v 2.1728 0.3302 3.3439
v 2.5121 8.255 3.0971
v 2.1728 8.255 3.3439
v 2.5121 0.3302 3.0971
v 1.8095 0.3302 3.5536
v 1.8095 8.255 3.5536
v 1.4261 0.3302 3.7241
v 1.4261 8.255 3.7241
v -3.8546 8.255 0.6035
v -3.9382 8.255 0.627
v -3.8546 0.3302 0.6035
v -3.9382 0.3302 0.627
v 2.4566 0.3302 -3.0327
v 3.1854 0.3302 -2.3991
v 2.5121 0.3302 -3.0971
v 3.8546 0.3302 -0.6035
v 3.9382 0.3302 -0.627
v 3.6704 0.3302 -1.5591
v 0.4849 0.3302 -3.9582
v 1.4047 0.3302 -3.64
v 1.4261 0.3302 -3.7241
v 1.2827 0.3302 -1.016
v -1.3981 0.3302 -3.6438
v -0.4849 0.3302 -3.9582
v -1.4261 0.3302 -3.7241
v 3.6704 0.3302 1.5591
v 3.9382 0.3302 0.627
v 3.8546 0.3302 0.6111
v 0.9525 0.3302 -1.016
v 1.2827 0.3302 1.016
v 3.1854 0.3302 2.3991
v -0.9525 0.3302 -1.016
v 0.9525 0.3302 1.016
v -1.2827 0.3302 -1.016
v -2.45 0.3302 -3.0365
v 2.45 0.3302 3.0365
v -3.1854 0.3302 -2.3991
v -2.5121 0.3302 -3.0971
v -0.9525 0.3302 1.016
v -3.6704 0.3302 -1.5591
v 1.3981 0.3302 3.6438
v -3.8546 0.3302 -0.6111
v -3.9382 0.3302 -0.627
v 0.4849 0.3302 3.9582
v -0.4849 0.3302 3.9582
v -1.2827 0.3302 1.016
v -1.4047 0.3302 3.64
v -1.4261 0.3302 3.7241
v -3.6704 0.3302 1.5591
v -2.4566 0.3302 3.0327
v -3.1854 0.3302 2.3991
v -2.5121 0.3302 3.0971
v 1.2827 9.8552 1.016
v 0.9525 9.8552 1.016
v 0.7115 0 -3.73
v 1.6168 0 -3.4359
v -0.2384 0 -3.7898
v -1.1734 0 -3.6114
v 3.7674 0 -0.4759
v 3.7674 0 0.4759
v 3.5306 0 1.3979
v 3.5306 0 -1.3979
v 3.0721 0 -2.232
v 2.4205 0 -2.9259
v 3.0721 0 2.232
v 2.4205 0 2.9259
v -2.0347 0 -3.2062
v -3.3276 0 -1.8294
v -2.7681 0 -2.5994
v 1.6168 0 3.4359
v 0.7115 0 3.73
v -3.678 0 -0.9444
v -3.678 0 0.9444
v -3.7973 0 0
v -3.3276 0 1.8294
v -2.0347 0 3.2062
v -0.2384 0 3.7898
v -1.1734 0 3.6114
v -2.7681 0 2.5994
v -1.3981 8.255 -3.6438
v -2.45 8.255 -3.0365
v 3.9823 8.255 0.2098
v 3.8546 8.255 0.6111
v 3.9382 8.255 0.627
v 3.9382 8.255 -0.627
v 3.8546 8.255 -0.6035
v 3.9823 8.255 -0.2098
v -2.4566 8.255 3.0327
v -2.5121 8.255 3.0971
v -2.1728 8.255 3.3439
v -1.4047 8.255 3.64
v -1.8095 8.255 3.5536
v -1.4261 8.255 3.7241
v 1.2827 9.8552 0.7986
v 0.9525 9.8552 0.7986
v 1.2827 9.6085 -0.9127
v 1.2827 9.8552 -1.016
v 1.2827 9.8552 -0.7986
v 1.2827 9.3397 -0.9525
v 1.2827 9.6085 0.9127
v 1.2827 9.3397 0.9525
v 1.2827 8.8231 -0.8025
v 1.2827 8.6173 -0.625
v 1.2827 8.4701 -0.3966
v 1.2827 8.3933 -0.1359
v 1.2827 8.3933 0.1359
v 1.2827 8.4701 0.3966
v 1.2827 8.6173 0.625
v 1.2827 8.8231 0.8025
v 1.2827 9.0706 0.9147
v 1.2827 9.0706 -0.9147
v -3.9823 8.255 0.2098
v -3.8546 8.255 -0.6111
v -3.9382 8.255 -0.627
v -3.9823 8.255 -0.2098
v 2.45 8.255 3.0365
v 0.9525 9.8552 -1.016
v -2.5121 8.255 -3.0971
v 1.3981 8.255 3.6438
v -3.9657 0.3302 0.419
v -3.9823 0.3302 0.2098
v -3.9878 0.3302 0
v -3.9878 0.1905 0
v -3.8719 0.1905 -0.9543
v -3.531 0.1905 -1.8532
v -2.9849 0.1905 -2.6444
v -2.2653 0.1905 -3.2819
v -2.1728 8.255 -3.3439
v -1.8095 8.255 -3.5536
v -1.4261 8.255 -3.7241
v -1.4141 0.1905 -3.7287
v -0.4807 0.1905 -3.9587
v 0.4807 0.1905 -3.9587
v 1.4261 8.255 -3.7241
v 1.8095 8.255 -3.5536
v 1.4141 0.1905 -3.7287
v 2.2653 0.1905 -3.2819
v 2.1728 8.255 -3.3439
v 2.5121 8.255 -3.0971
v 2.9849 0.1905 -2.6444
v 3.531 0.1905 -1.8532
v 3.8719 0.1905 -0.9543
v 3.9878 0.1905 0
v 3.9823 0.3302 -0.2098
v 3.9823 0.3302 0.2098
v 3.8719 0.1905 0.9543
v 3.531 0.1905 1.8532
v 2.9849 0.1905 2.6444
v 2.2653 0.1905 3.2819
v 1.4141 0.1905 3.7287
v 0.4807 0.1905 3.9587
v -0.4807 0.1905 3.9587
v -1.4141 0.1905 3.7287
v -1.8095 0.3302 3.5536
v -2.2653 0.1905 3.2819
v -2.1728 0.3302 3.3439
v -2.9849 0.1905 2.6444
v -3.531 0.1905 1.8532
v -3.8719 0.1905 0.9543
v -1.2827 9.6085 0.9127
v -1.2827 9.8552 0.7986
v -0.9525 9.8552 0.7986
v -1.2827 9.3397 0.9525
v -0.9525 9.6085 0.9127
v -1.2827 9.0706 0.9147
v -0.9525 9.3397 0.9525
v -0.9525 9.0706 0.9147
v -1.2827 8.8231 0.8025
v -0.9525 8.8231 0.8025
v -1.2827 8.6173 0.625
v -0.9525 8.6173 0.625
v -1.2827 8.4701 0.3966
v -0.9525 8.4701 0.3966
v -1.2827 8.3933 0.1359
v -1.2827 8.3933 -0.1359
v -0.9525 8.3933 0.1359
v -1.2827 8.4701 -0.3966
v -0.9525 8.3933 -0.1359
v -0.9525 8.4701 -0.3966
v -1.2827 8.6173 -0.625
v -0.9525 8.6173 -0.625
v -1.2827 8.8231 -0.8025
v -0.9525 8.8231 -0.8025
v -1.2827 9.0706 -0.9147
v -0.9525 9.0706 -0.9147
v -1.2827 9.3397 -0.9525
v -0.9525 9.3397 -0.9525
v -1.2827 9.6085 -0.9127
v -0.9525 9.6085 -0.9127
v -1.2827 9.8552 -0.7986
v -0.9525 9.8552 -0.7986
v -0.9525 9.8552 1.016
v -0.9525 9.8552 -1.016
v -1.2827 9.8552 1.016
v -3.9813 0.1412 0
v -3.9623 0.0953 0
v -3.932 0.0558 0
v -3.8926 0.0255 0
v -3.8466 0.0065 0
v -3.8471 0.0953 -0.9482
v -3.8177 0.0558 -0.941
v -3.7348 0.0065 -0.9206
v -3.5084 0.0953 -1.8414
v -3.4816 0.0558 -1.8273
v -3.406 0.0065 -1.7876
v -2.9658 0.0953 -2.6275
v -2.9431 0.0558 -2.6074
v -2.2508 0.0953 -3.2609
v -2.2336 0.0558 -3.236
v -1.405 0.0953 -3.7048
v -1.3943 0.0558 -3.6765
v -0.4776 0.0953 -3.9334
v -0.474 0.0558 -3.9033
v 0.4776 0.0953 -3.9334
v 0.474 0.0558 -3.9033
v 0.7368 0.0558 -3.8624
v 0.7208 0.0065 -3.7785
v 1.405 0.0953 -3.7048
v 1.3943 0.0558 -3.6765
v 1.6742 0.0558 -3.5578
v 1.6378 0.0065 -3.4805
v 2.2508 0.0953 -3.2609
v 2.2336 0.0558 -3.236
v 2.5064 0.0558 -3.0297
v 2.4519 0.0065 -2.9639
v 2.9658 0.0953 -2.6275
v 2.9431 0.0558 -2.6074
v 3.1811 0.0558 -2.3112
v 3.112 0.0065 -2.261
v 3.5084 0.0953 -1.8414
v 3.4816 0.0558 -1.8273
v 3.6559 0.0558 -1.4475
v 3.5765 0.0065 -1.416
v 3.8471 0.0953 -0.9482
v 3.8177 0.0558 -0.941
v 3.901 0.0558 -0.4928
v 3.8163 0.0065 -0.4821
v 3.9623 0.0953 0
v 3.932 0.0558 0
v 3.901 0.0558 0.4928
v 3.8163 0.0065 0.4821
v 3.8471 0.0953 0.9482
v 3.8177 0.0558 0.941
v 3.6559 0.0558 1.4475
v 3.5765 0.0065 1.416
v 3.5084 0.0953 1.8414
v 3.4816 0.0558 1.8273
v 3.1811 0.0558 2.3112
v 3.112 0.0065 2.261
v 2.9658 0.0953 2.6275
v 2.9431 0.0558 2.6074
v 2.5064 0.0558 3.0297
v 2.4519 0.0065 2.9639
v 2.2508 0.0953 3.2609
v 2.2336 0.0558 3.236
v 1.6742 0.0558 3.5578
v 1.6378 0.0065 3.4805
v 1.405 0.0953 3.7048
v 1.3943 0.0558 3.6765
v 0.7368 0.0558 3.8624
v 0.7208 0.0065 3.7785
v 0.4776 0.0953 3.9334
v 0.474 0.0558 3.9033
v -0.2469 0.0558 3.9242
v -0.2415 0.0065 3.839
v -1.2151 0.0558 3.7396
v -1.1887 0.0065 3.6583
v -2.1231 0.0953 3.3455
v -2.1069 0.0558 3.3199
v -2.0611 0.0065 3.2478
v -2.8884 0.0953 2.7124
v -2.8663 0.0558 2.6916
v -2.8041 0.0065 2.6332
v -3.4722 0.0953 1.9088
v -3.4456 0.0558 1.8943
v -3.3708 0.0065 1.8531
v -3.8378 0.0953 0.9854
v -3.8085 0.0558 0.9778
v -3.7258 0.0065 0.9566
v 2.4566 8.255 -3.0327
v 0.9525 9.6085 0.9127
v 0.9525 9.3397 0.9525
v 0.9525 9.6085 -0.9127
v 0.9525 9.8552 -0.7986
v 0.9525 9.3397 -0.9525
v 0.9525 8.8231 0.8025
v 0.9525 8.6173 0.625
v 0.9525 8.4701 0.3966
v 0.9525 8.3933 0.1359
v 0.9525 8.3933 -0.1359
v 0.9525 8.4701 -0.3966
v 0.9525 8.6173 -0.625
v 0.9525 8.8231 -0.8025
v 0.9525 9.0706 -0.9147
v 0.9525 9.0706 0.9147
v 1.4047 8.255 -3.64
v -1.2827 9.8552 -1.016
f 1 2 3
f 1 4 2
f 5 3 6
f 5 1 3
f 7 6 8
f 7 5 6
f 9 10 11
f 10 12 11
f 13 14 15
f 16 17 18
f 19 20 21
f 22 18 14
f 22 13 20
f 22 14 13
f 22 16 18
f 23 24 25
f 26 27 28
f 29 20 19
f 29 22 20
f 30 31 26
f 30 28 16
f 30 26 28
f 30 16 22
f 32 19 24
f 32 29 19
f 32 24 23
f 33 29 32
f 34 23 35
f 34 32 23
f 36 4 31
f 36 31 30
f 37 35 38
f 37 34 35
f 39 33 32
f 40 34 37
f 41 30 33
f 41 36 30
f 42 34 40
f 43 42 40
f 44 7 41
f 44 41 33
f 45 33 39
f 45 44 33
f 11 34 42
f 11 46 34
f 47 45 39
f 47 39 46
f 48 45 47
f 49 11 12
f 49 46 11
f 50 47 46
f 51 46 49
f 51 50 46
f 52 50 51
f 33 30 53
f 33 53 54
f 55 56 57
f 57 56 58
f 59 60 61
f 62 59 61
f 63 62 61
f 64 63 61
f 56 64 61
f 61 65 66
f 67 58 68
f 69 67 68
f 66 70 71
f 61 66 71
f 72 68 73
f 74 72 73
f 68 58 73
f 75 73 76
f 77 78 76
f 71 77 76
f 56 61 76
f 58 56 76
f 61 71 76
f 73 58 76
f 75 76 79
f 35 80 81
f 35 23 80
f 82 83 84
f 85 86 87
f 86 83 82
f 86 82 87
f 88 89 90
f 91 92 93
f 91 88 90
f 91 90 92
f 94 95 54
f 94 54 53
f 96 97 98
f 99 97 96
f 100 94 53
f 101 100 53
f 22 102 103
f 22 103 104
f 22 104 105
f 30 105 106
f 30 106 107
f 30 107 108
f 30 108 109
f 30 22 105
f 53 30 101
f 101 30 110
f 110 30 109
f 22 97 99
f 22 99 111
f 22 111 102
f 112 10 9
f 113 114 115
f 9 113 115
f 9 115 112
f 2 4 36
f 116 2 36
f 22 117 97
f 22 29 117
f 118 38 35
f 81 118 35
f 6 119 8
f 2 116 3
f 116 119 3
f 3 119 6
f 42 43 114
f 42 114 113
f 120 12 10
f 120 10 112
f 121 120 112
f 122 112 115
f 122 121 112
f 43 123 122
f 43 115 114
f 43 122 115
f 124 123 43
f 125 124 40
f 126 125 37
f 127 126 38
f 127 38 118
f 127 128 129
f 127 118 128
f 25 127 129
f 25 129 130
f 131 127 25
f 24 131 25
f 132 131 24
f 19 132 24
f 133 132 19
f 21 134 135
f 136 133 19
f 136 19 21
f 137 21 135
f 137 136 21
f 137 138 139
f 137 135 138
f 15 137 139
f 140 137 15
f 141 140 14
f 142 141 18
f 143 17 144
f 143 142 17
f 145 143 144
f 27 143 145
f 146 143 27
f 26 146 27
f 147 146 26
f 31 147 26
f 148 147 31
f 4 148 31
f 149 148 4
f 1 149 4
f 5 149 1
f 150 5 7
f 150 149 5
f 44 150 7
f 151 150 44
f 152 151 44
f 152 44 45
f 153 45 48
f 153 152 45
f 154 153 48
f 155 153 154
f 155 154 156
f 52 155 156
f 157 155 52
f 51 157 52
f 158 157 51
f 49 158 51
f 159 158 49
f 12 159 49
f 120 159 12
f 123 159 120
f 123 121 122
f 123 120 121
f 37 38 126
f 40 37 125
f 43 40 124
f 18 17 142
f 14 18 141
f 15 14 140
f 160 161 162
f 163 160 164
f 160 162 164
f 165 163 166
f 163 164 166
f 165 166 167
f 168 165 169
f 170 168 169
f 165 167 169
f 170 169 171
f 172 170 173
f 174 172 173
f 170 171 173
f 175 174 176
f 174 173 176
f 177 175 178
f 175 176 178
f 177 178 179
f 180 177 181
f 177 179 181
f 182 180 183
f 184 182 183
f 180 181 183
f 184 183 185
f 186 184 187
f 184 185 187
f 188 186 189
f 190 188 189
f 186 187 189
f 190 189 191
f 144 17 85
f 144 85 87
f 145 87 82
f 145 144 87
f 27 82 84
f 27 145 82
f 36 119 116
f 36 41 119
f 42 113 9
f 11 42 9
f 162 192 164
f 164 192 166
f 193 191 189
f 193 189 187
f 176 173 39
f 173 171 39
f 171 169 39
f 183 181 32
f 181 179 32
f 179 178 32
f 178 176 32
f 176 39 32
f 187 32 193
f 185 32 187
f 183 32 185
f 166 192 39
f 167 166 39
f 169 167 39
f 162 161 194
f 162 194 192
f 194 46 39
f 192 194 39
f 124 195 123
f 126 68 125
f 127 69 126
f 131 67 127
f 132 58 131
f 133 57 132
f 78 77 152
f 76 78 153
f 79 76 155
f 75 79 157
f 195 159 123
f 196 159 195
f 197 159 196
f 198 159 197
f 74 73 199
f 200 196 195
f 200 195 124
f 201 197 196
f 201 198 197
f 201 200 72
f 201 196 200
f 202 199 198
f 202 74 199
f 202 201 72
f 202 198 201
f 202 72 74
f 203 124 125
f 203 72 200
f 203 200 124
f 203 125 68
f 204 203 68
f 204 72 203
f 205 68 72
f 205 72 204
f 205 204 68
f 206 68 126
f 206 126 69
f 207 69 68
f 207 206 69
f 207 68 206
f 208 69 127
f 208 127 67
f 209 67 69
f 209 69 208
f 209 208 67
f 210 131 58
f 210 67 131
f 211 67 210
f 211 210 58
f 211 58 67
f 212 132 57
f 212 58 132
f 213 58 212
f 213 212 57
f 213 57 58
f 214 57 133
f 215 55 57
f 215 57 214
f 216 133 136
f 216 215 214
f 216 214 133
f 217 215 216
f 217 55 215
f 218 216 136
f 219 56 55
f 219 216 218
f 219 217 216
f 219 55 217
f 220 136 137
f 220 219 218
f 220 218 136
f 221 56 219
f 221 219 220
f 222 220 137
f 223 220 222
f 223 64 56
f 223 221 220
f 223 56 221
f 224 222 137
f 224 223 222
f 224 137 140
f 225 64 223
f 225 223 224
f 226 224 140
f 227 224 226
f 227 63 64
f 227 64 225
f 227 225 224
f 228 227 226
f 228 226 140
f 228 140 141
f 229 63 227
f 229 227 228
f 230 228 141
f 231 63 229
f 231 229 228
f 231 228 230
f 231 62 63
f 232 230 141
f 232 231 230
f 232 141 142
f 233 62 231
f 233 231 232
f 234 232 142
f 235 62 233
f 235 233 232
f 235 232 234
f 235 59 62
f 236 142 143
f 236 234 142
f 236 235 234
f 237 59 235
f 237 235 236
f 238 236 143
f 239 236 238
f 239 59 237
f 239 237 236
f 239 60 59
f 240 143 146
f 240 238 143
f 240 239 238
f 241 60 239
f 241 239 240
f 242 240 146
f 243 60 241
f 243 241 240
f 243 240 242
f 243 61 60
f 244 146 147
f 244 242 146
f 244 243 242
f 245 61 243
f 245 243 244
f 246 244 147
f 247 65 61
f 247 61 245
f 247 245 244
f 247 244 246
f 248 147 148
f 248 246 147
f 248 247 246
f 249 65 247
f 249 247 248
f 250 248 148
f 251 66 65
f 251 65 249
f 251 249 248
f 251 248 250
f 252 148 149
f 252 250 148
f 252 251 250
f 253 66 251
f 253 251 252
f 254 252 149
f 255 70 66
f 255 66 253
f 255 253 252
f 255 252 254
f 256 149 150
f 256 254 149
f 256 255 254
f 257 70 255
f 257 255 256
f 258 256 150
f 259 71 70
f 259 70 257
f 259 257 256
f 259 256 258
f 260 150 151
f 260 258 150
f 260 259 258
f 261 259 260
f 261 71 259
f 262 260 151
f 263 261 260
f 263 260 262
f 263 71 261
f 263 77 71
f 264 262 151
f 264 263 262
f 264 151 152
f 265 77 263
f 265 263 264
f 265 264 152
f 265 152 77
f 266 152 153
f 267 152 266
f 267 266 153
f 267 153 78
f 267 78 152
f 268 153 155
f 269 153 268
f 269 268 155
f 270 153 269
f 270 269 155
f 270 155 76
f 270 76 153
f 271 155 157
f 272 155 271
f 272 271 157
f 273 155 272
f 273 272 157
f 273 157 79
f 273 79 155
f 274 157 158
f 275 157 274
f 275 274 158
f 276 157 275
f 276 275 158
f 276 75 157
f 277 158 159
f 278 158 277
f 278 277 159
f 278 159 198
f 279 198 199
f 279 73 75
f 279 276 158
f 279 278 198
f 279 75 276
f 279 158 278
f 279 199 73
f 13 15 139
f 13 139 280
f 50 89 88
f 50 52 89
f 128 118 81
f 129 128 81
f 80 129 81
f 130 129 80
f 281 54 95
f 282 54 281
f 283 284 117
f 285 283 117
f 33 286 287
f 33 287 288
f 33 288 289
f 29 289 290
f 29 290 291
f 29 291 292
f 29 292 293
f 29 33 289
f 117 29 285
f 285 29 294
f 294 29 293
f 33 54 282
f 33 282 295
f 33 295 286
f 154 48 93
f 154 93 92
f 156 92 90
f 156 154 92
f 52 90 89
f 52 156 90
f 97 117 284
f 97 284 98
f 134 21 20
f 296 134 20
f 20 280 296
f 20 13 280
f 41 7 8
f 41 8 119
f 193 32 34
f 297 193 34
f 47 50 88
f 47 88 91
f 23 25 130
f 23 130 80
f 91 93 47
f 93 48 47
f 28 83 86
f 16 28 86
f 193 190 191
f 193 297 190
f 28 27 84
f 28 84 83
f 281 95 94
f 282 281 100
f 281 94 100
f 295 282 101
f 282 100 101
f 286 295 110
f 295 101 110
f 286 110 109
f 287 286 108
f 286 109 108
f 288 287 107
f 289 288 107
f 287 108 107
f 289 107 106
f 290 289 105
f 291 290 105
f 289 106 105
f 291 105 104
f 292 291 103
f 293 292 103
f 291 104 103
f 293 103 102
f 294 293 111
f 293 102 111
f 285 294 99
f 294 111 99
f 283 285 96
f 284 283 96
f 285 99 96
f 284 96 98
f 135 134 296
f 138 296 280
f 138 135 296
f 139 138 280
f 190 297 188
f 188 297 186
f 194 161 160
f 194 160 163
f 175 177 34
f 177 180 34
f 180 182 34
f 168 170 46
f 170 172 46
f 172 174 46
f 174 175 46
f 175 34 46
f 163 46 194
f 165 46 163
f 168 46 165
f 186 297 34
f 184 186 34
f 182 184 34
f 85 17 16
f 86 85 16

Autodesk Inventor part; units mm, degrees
ref_plane "YZ Plane" through (0, 0, 0) normal (1, 0, 0) x (0, 1, 0)
ref_plane "XZ Plane" through (0, 0, 0) normal (0, 1, 0) x (-1, 0, 0)
ref_plane "XY Plane" through (0, 0, 0) normal (0, 0, 1) x (1, 0, 0)
sketch "Sketch1" plane through (0, 0, 0) normal (0, 1, 0) x (-1, 0, 0)
  circle A0 centre (0, 0) radius 3.9878
  dimension "d0" = 7.9756
extrude "Extrusion1" add sketch "Sketch1" along normal blind 0.3302
sketch "Sketch2" plane through (0, 0.3302, 0) normal (0, 1, 0) x (1, 0, 0)
  circle A0 centre (0, 0) radius 3.9878 projected
  arc A1 (-3.9382, 0.627) -> (-3.9382, -0.627) centre (0, 0) ccw
  line L0 (-3.9382, -0.627) -> (-3.9382, 0.627) construction
  line L1 (-3.9382, -0.627) -> (-2.6841, -0.627) construction
  line L2 (-3.9382, -0.627) -> (-3.8546, -0.6035)
  line L3 (-3.9382, 0.627) -> (-3.8546, 0.6111)
  line L4 (-3.8546, 0.6111) -> (-3.8546, -0.6035)
  line L5 (-2.4566, -3.0327) -> (-1.4047, -3.64)
  arc A2 (-2.5121, -3.0971) -> (-1.4261, -3.7241) centre (0, 0) ccw
  line L6 (-1.4261, -3.7241) -> (-1.4047, -3.64)
  line L7 (-2.5121, -3.0971) -> (-2.4566, -3.0327)
  line L8 (1.3981, -3.6438) -> (2.45, -3.0365)
  arc A3 (1.4261, -3.7241) -> (2.5121, -3.0971) centre (0, 0) ccw
  line L9 (2.5121, -3.0971) -> (2.45, -3.0365)
  line L10 (1.4261, -3.7241) -> (1.3981, -3.6438)
  line L11 (3.8546, -0.6111) -> (3.8546, 0.6035)
  arc A4 (3.9382, -0.627) -> (3.9382, 0.627) centre (0, 0) ccw
  line L12 (3.9382, 0.627) -> (3.8546, 0.6035)
  line L13 (3.9382, -0.627) -> (3.8546, -0.6111)
  line L14 (2.4566, 3.0327) -> (1.4047, 3.64)
  arc A5 (2.5121, 3.0971) -> (1.4261, 3.7241) centre (0, 0) ccw
  line L15 (1.4261, 3.7241) -> (1.4047, 3.64)
  line L16 (2.5121, 3.0971) -> (2.4566, 3.0327)
  line L17 (-1.3981, 3.6438) -> (-2.45, 3.0365)
  arc A6 (-1.4261, 3.7241) -> (-2.5121, 3.0971) centre (0, 0) ccw
  line L18 (-2.5121, 3.0971) -> (-2.45, 3.0365)
  line L19 (-1.4261, 3.7241) -> (-1.3981, 3.6438)
  dimension "d3" = 90
  dimension "d6" = 360
extrude "Extrusion2" add sketch "Sketch2" along normal blind 7.9248 contours A0 L13 L11 L12 | L16 L14 L15 A0 | A0 L10 L8 L9 | L19 L17 L18 A0 | A0 L7 L5 L6 | L3 L4 L2 A0
fillet "Fillet1" radius 0.1905 1 edges at (3.9878, 0, 0)
sketch "Sketch3" plane through (0, 0.3302, 0) normal (0, 1, 0) x (1, 0, 0)
  line L0 (-0.9525, 1.016) -> (-1.2827, 1.016)
  line L1 (-1.2827, 1.016) -> (-1.2827, -1.016)
  line L2 (-1.2827, -1.016) -> (-0.9525, -1.016)
  line L3 (-0.9525, -1.016) -> (-0.9525, 1.016)
  line L4 (0, 2.5556) -> (0, -1.5997)
  line L5 (0.9525, 1.016) -> (1.2827, 1.016)
  line L6 (1.2827, 1.016) -> (1.2827, -1.016)
  line L7 (1.2827, -1.016) -> (0.9525, -1.016)
  line L8 (0.9525, -1.016) -> (0.9525, 1.016)
  point P0 (0, 0)
  dimension "d11" = 0.3302
  dimension "d12" = 2.032
  dimension "d13" = 1.016
  dimension "d14" = 0.9525
extrude "Extrusion3" add sketch "Sketch3" along normal blind 9.525
sketch "Sketch5" plane through (1.2827, 0.3302, 1.016) normal (1, 0, 0) x (0, 0, -1)
  circle A0 centre (1.016, 9.0059) radius 0.9525
  point P0 (1.016, -0.3302)
  dimension "d18" = 1.905
extrude "Extrusion4" cut sketch "Sketch5" against normal through all
properties part number "piston holder thing" material "Aluminum 6061"
